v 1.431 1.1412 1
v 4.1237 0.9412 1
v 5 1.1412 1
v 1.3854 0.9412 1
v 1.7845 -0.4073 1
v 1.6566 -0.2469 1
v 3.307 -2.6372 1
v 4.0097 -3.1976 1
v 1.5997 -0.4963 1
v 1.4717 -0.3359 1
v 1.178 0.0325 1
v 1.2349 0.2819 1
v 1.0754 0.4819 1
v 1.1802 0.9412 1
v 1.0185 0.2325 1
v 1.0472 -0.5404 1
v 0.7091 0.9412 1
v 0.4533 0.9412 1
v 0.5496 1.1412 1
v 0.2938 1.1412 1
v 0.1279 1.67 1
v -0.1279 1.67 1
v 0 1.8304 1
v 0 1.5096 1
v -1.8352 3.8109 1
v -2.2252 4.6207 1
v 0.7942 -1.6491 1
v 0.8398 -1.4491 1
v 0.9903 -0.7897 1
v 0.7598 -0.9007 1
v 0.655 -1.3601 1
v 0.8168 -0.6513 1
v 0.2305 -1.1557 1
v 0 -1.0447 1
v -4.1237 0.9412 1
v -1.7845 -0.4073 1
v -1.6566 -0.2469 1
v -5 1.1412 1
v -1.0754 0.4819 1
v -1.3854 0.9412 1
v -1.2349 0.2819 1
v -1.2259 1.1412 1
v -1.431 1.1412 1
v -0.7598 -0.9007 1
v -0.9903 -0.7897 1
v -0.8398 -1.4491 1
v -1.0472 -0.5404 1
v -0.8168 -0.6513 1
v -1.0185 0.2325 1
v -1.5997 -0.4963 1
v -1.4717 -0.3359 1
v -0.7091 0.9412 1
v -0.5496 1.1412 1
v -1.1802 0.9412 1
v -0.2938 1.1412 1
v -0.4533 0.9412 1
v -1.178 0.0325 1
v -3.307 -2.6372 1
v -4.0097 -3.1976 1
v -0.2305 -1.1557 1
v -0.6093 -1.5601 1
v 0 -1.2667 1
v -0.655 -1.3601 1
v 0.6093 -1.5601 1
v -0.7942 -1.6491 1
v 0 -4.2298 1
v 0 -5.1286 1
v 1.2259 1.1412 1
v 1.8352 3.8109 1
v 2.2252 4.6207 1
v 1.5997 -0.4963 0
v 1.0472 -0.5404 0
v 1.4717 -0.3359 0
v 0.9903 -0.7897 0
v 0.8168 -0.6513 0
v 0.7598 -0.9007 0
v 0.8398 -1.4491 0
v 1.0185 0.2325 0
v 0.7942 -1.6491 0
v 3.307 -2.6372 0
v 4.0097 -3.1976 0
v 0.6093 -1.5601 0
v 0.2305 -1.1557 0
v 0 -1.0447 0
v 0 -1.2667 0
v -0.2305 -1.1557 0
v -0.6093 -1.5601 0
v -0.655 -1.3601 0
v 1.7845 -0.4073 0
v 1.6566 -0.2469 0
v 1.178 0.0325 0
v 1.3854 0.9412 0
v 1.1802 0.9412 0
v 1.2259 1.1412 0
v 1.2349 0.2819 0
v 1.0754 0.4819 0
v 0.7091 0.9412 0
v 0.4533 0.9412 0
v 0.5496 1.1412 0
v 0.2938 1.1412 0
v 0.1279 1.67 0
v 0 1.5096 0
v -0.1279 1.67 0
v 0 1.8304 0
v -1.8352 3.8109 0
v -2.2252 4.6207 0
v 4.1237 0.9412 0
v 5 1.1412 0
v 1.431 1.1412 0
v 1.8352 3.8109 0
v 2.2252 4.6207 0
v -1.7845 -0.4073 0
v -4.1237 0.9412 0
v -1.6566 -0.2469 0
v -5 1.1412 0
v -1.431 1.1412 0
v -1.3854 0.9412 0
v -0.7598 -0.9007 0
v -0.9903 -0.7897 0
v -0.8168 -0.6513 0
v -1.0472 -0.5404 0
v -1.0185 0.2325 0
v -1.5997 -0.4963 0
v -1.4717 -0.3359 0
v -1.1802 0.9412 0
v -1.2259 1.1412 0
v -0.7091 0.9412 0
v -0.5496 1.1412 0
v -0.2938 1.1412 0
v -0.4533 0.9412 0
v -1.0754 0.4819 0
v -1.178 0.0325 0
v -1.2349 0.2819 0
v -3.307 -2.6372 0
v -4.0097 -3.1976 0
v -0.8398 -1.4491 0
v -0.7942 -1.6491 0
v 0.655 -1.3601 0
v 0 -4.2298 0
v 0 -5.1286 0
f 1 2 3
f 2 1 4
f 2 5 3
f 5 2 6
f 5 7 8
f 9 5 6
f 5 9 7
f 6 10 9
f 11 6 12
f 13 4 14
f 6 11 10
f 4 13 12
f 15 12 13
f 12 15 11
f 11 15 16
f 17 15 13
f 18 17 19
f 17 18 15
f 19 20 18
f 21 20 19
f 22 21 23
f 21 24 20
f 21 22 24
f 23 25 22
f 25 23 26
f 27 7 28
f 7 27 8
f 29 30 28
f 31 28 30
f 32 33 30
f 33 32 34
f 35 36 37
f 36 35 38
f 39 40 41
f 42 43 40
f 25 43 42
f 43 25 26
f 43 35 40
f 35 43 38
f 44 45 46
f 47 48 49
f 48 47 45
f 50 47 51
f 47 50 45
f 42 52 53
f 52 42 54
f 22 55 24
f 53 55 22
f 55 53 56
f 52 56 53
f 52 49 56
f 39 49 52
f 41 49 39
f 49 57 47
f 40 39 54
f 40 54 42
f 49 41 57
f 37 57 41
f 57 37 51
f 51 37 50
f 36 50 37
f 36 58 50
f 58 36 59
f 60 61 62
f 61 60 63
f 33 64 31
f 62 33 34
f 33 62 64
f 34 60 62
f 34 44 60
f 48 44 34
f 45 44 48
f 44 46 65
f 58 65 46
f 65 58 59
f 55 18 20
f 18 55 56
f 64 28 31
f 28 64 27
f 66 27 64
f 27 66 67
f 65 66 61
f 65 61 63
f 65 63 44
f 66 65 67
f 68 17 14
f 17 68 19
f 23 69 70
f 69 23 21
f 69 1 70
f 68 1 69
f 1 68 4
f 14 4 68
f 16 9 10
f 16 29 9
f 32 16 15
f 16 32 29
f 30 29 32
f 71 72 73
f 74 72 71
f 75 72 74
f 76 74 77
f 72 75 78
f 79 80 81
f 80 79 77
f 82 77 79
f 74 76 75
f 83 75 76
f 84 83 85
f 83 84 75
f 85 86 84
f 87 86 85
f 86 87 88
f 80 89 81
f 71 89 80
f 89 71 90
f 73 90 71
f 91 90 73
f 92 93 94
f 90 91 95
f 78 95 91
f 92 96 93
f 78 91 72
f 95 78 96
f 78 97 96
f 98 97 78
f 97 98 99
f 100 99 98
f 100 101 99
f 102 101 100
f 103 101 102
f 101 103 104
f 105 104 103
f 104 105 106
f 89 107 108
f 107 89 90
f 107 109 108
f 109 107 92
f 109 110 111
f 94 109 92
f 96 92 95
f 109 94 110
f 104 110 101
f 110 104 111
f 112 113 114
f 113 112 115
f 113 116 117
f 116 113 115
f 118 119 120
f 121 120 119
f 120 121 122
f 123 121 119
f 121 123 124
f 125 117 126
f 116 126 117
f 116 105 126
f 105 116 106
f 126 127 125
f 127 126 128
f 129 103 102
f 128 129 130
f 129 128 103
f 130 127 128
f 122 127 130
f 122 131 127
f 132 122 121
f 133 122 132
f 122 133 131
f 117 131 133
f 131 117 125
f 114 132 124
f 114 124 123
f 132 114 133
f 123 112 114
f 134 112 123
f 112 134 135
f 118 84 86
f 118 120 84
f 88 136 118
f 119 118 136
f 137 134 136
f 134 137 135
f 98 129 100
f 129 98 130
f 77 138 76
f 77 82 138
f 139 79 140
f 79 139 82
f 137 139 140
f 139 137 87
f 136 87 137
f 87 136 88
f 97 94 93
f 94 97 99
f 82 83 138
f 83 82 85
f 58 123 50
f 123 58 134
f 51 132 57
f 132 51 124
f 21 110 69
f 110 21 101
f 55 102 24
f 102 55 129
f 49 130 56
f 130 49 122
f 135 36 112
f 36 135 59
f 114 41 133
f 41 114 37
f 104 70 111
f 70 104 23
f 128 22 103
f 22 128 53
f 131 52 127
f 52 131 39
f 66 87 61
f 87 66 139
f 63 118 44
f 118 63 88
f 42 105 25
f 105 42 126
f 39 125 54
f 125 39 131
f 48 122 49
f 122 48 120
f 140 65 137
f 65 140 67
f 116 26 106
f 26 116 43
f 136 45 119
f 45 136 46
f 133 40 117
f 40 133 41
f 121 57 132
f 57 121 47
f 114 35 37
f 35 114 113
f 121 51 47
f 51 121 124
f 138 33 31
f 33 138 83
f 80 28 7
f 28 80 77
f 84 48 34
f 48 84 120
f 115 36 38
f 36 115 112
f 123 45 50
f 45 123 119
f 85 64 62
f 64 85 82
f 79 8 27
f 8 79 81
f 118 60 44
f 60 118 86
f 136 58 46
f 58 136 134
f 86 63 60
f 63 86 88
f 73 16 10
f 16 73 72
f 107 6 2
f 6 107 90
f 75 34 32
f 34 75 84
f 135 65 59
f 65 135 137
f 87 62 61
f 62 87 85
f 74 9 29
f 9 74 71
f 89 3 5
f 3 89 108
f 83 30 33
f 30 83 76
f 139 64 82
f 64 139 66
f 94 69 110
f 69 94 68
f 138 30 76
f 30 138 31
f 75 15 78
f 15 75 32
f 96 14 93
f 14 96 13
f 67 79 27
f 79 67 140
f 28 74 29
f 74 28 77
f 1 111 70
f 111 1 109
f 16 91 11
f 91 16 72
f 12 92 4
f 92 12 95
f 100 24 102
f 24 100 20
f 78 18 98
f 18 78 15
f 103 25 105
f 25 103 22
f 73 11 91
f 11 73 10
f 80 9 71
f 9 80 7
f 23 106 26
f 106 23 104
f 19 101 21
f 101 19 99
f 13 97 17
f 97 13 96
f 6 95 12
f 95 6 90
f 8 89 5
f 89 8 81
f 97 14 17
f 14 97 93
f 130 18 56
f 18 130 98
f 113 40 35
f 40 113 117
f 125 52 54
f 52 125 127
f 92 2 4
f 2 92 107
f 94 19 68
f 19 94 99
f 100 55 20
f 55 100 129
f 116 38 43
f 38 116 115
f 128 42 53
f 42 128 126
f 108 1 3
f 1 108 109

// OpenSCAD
// [FL_INDEX: keywords="openscad, 3d_parametric, Customizable_Star_Polygon, csg_solid" | COT="Parametric OpenSCAD design from 3DCodeverse"]
// Title: Customizable Star Polygon

//Customizable Star Polygon
//Created by Ari M. Diacou, January 2014
//Shared under Creative Commons License: Attribution-ShareAlike 3.0 Unported (CC BY-SA 3.0) 
//see http://creativecommons.org/licenses/by-sa/3.0/

// preview[view:south, tilt:top diagonal]
//The length of one of the sides of the star
length=10;
//The thickness of one of the sides of the star
thickness=.2;
//The height of one of the sides of the star
height=1;
//Vertices (number of points)
p=7;//[5,7,9,11,13,15,17,19]
//Density
//q=5;

/* HIDDEN */
angle=abs(180/p); echo("angle = ",angle);//internal angle of the points
circle_radius=length/(2*sin(2*angle));echo("circle_radius = ",circle_radius);//circle that the polygon is inscribed in
sagitta=circle_radius-sqrt(circle_radius*circle_radius-.25*length*length);echo("sagitta = ",sagitta); //distance from a vertex to the side of the polygon at the vertex's base
side_length=2*sagitta*sin(angle/2)/cos(angle/2); echo("side_length = ",side_length);//the length of the side of the internal polygon
apothem=.5*side_length*cos(180/p)/sin(180/p); echo("apothem = ",apothem); //distance from the origin to one of the sides in the internal regular polygon

module side(){
	mirror([0,1,0]){
		difference(){
			cube([length,thickness,height]);
			rotate([0,0,angle]) 
				cube([thickness/sin(angle),thickness,height]);
			translate([length,0,0]) 	
				mirror([1,0,0]){
					rotate([0,0,angle]) 
						cube([thickness/sin(angle),thickness,height]);
					}
			}
		}
	}

for(i=[1:p]){
	   rotate([0,0,i*2*angle]) 
			translate([-length/2,apothem,0]) 
				side();
		}
